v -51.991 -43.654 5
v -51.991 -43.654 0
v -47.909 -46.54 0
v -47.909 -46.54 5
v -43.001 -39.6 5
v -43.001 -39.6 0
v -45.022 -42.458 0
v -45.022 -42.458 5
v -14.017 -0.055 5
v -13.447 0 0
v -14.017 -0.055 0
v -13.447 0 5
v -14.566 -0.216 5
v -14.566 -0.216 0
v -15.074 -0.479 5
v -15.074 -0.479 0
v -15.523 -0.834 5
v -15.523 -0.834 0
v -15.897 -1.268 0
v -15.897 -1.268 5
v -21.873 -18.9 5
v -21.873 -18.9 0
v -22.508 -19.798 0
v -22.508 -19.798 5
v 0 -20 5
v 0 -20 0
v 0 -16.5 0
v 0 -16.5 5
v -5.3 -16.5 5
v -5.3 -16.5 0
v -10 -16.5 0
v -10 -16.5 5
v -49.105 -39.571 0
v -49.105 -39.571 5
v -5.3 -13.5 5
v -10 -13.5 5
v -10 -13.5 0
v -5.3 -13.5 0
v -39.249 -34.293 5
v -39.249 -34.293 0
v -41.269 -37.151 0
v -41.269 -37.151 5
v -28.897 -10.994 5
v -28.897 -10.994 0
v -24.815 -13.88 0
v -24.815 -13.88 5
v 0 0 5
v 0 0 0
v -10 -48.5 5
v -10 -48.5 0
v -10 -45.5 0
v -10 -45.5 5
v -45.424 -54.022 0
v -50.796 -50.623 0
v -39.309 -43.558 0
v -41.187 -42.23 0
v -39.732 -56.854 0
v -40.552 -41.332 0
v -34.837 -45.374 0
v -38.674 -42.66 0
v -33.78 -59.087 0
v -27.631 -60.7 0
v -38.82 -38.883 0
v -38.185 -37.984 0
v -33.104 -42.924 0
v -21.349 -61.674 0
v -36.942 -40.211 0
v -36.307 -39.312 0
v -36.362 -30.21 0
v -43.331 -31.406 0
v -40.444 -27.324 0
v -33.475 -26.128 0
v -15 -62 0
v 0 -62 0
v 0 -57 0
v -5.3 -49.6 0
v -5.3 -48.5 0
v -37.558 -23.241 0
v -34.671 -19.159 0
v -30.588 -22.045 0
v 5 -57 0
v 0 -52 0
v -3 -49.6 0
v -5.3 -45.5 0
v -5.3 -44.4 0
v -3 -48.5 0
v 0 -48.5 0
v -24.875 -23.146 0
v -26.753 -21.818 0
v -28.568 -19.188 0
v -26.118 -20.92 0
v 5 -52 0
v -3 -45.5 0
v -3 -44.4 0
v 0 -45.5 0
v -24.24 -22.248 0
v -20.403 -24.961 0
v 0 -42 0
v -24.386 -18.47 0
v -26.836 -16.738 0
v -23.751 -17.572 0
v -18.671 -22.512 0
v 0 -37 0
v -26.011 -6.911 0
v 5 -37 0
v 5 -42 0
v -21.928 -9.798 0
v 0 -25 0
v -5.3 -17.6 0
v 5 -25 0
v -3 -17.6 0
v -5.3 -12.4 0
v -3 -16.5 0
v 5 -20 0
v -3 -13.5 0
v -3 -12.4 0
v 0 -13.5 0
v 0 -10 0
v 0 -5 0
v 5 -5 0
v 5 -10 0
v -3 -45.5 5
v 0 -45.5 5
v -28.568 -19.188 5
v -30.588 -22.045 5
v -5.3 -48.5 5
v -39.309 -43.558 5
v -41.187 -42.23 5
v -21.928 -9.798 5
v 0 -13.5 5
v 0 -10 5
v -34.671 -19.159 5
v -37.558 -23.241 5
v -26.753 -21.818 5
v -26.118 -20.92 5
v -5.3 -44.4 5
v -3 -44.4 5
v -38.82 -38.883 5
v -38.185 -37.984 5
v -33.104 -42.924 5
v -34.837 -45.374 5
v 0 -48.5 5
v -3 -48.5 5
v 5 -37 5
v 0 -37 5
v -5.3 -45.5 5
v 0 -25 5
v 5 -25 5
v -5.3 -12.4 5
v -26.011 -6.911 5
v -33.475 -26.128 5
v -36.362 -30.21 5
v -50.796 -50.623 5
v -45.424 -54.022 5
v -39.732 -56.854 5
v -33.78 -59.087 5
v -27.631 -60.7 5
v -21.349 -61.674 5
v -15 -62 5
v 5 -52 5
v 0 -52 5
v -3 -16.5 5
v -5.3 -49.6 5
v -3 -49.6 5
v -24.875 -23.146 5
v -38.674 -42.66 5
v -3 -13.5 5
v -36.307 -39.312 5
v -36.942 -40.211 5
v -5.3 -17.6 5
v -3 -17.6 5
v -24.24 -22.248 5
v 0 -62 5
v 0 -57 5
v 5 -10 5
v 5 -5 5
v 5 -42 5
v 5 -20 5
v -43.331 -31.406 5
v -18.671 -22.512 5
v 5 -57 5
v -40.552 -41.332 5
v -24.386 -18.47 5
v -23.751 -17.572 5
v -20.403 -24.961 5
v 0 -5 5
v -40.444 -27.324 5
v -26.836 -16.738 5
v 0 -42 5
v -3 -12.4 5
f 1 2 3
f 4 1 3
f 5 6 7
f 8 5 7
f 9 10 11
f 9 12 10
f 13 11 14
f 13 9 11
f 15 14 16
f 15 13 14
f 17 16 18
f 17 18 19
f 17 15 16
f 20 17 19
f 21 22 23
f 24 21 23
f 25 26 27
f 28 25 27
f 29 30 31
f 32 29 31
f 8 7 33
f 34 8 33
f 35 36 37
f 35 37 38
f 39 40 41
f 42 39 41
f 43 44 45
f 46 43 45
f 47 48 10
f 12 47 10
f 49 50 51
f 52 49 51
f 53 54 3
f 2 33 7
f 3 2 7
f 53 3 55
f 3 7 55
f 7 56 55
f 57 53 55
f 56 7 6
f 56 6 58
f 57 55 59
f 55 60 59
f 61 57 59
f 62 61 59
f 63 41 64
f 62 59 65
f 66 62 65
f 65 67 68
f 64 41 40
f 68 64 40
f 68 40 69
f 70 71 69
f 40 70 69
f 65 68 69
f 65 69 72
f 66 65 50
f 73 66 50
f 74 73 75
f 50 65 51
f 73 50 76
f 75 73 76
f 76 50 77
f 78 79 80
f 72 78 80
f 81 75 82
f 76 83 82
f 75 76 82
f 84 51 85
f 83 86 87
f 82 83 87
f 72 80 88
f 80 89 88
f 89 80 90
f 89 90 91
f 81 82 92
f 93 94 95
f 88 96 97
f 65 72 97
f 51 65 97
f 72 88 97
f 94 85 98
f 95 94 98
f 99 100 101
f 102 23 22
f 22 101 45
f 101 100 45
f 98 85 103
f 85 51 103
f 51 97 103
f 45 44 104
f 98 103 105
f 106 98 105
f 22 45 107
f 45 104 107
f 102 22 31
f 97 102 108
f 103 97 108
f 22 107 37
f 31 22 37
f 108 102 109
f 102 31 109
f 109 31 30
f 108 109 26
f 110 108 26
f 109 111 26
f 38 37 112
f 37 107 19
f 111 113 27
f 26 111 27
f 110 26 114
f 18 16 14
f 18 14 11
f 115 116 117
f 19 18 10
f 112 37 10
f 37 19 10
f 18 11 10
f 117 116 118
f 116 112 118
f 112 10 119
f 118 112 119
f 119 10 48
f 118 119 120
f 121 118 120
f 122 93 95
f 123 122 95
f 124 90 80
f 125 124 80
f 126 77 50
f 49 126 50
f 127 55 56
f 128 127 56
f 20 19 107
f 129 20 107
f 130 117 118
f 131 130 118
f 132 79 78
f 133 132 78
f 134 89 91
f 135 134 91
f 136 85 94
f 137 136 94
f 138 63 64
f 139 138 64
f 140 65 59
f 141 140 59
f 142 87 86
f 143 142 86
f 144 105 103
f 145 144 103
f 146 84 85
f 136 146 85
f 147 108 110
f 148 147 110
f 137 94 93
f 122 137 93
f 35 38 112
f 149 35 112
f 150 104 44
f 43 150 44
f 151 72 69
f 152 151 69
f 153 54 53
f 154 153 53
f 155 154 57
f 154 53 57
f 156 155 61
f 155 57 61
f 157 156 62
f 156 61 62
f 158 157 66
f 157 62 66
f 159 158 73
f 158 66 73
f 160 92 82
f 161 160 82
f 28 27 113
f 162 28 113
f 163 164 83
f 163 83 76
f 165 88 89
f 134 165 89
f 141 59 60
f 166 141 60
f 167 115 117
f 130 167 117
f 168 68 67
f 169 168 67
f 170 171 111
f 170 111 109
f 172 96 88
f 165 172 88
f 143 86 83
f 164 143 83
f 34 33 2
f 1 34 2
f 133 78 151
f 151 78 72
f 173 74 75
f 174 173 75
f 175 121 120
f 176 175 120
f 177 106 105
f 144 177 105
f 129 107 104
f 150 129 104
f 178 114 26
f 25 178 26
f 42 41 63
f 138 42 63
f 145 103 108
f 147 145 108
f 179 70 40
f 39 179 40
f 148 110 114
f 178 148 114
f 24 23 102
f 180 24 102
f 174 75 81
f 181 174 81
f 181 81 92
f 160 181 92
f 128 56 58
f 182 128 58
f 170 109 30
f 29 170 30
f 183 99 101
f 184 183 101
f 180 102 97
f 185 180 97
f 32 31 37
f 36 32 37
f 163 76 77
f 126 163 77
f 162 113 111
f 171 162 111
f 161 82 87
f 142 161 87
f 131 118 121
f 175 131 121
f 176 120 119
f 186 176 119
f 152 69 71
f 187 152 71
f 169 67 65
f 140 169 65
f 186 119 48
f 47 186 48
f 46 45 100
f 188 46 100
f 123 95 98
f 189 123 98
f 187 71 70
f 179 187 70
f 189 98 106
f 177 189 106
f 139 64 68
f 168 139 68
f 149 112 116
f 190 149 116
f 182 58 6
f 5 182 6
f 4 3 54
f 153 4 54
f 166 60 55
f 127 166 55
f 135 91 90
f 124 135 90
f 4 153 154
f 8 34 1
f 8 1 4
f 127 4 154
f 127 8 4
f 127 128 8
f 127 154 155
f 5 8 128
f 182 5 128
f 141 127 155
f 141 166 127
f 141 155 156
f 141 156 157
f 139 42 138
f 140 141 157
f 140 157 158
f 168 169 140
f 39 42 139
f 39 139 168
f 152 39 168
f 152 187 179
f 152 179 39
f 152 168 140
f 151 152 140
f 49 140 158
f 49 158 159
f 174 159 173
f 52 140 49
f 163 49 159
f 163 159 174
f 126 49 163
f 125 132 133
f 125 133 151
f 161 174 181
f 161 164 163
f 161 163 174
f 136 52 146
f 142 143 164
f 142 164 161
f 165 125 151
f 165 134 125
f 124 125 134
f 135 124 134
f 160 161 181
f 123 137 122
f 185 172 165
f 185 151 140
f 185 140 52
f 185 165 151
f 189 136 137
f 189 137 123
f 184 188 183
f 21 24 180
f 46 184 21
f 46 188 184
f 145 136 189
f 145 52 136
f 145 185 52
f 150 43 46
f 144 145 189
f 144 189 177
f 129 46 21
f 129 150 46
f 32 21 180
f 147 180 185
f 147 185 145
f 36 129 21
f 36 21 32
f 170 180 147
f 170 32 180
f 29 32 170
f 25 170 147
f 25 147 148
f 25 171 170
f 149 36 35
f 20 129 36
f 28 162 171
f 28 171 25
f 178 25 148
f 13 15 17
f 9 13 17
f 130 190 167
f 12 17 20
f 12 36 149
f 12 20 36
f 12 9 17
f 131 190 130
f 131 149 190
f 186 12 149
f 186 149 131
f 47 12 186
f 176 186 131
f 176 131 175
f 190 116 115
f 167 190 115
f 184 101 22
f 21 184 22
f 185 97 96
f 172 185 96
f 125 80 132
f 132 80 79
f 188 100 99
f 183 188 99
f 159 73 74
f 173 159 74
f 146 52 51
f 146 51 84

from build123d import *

# Parameters (mm, degrees)
BOSS_EXTRU_1_DEPTH = 5
CONG_1_R           = 3


with BuildPart() as part:
    # Esquisse1 → Boss.-Extru.1 (new body)
    with BuildSketch(Plane.XY):
        with BuildLine():
            Line((0, -5), (0, 0))
            Line((0, 0), (-15, 0))
            Line((-15, 0), (-21.92820323, -9.797958971))
            Line((-21.92820323, -9.797958971), (-26.010686135, -6.911207626))
            Line((-26.010686135, -6.911207626), (-28.89743748, -10.99369053))
            Line((-28.89743748, -10.99369053), (-24.814954576, -13.880441876))
            Line((-24.814954576, -13.880441876), (-26.835680518, -16.73817991))
            Line((-26.835680518, -16.73817991), (-24.386190775, -18.470230717))
            Line((-24.386190775, -18.470230717), (-23.751105479, -17.572084478))
            Line((-23.751105479, -17.572084478), (-21.873163342, -18.899990097))
            Line((-21.873163342, -18.899990097), (-22.508248639, -19.798136336))
            Line((-22.508248639, -19.798136336), (-18.670714708, -22.511682601))
            Line((-18.670714708, -22.511682601), (-20.402765515, -24.961172344))
            Line((-20.402765515, -24.961172344), (-24.240299446, -22.247626079))
            Line((-24.240299446, -22.247626079), (-24.875384742, -23.145772318))
            Line((-24.875384742, -23.145772318), (-26.753326878, -21.817866699))
            Line((-26.753326878, -21.817866699), (-26.118241582, -20.91972046))
            Line((-26.118241582, -20.91972046), (-28.567731325, -19.187669652))
            Line((-28.567731325, -19.187669652), (-30.588457267, -22.045407686))
            Line((-30.588457267, -22.045407686), (-34.670940172, -19.15865634))
            Line((-34.670940172, -19.15865634), (-37.557691518, -23.241139245))
            Line((-37.557691518, -23.241139245), (-33.475208613, -26.127890591))
            Line((-33.475208613, -26.127890591), (-36.361959959, -30.210373495))
            Line((-36.361959959, -30.210373495), (-40.444442863, -27.32362215))
            Line((-40.444442863, -27.32362215), (-43.331194209, -31.406105054))
            Line((-43.331194209, -31.406105054), (-39.248711304, -34.2928564))
            Line((-39.248711304, -34.2928564), (-41.269437246, -37.150594433))
            Line((-41.269437246, -37.150594433), (-38.819947503, -38.882645241))
            Line((-38.819947503, -38.882645241), (-38.184862207, -37.984499002))
            Line((-38.184862207, -37.984499002), (-36.306920071, -39.312404621))
            Line((-36.306920071, -39.312404621), (-36.942005367, -40.21055086))
            Line((-36.942005367, -40.21055086), (-33.104471437, -42.924097125))
            Line((-33.104471437, -42.924097125), (-34.836522244, -45.373586868))
            Line((-34.836522244, -45.373586868), (-38.674056175, -42.660040603))
            Line((-38.674056175, -42.660040603), (-39.309141471, -43.558186842))
            Line((-39.309141471, -43.558186842), (-41.187083607, -42.230281223))
            Line((-41.187083607, -42.230281223), (-40.551998311, -41.332134984))
            Line((-40.551998311, -41.332134984), (-43.001488054, -39.600084176))
            Line((-43.001488054, -39.600084176), (-45.022213996, -42.45782221))
            Line((-45.022213996, -42.45782221), (-49.104696901, -39.571070864))
            Line((-49.104696901, -39.571070864), (-51.991448246, -43.653553769))
            Line((-51.991448246, -43.653553769), (-47.908965342, -46.540305114))
            Line((-47.908965342, -46.540305114), (-50.795716687, -50.622788019))
            ThreePointArc((-50.795716687, -50.622788019), (-33.780137683, -59.08727806), (-15, -62))
            Line((-15, -62), (0, -62))
            Line((0, -62), (0, -57))
            Line((0, -57), (5, -57))
            Line((5, -57), (5, -52))
            Line((5, -52), (0, -52))
            Line((0, -52), (0, -48.5))
            Line((0, -48.5), (-3, -48.5))
            Line((-3, -48.5), (-3, -49.6))
            Line((-3, -49.6), (-5.3, -49.6))
            Line((-5.3, -49.6), (-5.3, -48.5))
            Line((-5.3, -48.5), (-10, -48.5))
            Line((-10, -48.5), (-10, -45.5))
            Line((-10, -45.5), (-5.3, -45.5))
            Line((-5.3, -45.5), (-5.3, -44.4))
            Line((-5.3, -44.4), (-3, -44.4))
            Line((-3, -44.4), (-3, -45.5))
            Line((-3, -45.5), (0, -45.5))
            Line((0, -45.5), (0, -42))
            Line((0, -42), (5, -42))
            Line((5, -42), (5, -37))
            Line((5, -37), (0, -37))
            Line((0, -37), (0, -25))
            Line((0, -25), (5, -25))
            Line((5, -25), (5, -20))
            Line((5, -20), (0, -20))
            Line((0, -20), (0, -16.5))
            Line((0, -16.5), (-3, -16.5))
            Line((-3, -16.5), (-3, -17.6))
            Line((-3, -17.6), (-5.3, -17.6))
            Line((-5.3, -17.6), (-5.3, -16.5))
            Line((-5.3, -16.5), (-10, -16.5))
            Line((-10, -16.5), (-10, -13.5))
            Line((-10, -13.5), (-5.3, -13.5))
            Line((-5.3, -13.5), (-5.3, -12.4))
            Line((-5.3, -12.4), (-3, -12.4))
            Line((-3, -12.4), (-3, -13.5))
            Line((-3, -13.5), (0, -13.5))
            Line((0, -13.5), (0, -10))
            Line((0, -10), (5, -10))
            Line((5, -10), (5, -5))
            Line((5, -5), (0, -5))
        make_face()
    extrude(amount=BOSS_EXTRU_1_DEPTH)

    # Congé1
    cong_1_edges = [part.edges().sort_by_distance(p)[0] for p in [
        (-15, 0, 2.5),
    ]]
    fillet(cong_1_edges, radius=CONG_1_R)


solid = part.part
